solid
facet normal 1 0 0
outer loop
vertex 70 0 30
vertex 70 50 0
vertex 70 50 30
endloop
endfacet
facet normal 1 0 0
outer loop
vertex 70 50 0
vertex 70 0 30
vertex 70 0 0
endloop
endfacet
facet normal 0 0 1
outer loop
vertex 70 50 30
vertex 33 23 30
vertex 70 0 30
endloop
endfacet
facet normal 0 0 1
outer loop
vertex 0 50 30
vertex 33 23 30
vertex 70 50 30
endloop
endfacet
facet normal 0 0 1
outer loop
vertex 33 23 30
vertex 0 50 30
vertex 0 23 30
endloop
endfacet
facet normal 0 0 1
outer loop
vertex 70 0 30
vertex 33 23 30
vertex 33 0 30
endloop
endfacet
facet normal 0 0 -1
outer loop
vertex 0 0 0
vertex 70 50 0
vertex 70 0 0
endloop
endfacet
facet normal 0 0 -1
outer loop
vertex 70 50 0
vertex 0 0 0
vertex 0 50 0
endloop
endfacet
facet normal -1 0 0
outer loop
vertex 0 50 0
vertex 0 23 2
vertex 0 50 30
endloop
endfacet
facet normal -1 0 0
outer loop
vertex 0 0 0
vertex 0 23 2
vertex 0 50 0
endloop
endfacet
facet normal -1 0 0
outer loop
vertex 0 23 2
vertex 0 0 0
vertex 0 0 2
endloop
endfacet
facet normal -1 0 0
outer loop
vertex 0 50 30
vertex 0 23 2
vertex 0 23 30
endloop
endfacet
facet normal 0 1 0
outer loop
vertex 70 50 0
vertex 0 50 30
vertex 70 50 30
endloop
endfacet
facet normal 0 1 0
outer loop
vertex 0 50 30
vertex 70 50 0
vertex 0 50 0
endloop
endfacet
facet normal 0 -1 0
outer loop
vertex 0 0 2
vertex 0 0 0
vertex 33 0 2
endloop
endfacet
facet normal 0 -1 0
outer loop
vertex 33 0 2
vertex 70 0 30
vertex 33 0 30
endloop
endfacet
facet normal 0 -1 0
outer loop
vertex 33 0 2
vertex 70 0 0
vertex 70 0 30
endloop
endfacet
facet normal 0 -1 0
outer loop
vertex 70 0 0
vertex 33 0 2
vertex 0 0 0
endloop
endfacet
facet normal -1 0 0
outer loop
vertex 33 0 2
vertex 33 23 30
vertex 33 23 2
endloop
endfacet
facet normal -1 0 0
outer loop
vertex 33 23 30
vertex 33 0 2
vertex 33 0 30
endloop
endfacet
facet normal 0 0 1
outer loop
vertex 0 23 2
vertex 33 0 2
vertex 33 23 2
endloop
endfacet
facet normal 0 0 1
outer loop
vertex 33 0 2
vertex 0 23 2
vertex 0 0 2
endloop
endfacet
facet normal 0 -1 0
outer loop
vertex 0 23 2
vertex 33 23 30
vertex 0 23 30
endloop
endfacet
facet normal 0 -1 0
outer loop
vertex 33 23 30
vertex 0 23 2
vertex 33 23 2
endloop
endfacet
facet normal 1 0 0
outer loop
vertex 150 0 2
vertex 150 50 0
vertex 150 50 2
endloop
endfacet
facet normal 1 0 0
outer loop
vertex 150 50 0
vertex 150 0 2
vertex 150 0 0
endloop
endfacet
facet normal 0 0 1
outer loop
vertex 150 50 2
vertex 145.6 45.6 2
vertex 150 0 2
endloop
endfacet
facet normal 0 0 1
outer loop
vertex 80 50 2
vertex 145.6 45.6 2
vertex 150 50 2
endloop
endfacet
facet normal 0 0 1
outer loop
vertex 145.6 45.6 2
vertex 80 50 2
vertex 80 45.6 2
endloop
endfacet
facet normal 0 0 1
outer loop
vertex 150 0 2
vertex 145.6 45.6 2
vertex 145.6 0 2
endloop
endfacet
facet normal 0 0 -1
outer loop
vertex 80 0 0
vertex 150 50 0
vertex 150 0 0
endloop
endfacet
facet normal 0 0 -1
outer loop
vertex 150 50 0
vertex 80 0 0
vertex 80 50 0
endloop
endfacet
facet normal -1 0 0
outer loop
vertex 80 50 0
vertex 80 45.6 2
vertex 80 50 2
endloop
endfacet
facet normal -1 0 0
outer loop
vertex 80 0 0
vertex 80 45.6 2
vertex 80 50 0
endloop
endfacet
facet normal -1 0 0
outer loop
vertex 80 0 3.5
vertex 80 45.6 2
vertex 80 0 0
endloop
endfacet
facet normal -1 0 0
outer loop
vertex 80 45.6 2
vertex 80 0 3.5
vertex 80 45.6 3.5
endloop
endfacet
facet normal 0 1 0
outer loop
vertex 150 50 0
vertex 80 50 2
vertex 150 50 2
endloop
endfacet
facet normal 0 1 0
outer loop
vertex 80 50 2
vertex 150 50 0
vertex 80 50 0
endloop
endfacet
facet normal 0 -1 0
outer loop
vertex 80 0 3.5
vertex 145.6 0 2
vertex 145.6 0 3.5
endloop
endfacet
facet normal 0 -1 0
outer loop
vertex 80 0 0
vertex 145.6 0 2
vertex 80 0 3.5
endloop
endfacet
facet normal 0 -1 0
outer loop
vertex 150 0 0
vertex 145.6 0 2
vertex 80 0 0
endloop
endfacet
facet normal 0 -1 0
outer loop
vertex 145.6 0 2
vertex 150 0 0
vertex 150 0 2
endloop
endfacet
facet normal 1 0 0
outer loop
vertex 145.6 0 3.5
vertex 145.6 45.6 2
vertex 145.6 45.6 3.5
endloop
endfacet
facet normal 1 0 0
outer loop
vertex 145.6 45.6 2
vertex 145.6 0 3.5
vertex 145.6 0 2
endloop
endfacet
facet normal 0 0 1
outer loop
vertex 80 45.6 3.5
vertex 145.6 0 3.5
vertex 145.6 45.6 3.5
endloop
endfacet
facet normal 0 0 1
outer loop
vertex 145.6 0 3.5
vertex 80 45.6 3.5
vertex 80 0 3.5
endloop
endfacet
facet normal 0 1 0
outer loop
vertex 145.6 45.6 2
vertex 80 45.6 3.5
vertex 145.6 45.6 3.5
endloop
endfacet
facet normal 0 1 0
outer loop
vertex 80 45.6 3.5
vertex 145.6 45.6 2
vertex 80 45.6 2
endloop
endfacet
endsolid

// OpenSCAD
// Two-part enclosure for small electronics board
// Print orientation: box on bed (z = 0), lid on +X side, both build upward

// ---------- Parameters ----------
box_x      = 70;    // box outer length (X)
box_y      = 50;    // box outer width (Y)
box_z      = 30;    // box outer height (Z)
box_wall   = 2;     // box wall thickness
box_floor  = 2;     // box floor thickness

gap        = 10;    // gap between box and lid

lip_x      = 65.6;  // lip outer length (X)
lip_y      = 45.6;  // lip outer width (Y)
lip_wall   = 1.5;   // lip wall thickness
lip_h      = 4;     // lip height above plate

plate_x    = 70;    // plate length (X)
plate_y    = 50;    // plate width (Y)
plate_t    = 2;     // plate thickness

eps        = 0.5;   // cutter overshoot

$fn = 64;

// ---------- Derived ----------
box_xi = box_x - 2 * box_wall;   // box inner length
box_yi = box_y - 2 * box_wall;   // box inner width

// ---------- Model ----------
union() {
    // Box
    difference() {
        cube([box_x, box_y, box_z]);
        translate([-box_xi / 2, -box_yi / 2, box_floor])
            cube([box_xi, box_yi, box_z - box_floor + eps]);
    }

    // Lid
    translate([box_x + gap, 0, 0]) {
        union() {
            // Plate
            cube([plate_x, plate_y, plate_t]);
            // Lip
            translate([0, 0, plate_t])
                cube([lip_x, lip_y, lip_wall]);
        }
    }
}
